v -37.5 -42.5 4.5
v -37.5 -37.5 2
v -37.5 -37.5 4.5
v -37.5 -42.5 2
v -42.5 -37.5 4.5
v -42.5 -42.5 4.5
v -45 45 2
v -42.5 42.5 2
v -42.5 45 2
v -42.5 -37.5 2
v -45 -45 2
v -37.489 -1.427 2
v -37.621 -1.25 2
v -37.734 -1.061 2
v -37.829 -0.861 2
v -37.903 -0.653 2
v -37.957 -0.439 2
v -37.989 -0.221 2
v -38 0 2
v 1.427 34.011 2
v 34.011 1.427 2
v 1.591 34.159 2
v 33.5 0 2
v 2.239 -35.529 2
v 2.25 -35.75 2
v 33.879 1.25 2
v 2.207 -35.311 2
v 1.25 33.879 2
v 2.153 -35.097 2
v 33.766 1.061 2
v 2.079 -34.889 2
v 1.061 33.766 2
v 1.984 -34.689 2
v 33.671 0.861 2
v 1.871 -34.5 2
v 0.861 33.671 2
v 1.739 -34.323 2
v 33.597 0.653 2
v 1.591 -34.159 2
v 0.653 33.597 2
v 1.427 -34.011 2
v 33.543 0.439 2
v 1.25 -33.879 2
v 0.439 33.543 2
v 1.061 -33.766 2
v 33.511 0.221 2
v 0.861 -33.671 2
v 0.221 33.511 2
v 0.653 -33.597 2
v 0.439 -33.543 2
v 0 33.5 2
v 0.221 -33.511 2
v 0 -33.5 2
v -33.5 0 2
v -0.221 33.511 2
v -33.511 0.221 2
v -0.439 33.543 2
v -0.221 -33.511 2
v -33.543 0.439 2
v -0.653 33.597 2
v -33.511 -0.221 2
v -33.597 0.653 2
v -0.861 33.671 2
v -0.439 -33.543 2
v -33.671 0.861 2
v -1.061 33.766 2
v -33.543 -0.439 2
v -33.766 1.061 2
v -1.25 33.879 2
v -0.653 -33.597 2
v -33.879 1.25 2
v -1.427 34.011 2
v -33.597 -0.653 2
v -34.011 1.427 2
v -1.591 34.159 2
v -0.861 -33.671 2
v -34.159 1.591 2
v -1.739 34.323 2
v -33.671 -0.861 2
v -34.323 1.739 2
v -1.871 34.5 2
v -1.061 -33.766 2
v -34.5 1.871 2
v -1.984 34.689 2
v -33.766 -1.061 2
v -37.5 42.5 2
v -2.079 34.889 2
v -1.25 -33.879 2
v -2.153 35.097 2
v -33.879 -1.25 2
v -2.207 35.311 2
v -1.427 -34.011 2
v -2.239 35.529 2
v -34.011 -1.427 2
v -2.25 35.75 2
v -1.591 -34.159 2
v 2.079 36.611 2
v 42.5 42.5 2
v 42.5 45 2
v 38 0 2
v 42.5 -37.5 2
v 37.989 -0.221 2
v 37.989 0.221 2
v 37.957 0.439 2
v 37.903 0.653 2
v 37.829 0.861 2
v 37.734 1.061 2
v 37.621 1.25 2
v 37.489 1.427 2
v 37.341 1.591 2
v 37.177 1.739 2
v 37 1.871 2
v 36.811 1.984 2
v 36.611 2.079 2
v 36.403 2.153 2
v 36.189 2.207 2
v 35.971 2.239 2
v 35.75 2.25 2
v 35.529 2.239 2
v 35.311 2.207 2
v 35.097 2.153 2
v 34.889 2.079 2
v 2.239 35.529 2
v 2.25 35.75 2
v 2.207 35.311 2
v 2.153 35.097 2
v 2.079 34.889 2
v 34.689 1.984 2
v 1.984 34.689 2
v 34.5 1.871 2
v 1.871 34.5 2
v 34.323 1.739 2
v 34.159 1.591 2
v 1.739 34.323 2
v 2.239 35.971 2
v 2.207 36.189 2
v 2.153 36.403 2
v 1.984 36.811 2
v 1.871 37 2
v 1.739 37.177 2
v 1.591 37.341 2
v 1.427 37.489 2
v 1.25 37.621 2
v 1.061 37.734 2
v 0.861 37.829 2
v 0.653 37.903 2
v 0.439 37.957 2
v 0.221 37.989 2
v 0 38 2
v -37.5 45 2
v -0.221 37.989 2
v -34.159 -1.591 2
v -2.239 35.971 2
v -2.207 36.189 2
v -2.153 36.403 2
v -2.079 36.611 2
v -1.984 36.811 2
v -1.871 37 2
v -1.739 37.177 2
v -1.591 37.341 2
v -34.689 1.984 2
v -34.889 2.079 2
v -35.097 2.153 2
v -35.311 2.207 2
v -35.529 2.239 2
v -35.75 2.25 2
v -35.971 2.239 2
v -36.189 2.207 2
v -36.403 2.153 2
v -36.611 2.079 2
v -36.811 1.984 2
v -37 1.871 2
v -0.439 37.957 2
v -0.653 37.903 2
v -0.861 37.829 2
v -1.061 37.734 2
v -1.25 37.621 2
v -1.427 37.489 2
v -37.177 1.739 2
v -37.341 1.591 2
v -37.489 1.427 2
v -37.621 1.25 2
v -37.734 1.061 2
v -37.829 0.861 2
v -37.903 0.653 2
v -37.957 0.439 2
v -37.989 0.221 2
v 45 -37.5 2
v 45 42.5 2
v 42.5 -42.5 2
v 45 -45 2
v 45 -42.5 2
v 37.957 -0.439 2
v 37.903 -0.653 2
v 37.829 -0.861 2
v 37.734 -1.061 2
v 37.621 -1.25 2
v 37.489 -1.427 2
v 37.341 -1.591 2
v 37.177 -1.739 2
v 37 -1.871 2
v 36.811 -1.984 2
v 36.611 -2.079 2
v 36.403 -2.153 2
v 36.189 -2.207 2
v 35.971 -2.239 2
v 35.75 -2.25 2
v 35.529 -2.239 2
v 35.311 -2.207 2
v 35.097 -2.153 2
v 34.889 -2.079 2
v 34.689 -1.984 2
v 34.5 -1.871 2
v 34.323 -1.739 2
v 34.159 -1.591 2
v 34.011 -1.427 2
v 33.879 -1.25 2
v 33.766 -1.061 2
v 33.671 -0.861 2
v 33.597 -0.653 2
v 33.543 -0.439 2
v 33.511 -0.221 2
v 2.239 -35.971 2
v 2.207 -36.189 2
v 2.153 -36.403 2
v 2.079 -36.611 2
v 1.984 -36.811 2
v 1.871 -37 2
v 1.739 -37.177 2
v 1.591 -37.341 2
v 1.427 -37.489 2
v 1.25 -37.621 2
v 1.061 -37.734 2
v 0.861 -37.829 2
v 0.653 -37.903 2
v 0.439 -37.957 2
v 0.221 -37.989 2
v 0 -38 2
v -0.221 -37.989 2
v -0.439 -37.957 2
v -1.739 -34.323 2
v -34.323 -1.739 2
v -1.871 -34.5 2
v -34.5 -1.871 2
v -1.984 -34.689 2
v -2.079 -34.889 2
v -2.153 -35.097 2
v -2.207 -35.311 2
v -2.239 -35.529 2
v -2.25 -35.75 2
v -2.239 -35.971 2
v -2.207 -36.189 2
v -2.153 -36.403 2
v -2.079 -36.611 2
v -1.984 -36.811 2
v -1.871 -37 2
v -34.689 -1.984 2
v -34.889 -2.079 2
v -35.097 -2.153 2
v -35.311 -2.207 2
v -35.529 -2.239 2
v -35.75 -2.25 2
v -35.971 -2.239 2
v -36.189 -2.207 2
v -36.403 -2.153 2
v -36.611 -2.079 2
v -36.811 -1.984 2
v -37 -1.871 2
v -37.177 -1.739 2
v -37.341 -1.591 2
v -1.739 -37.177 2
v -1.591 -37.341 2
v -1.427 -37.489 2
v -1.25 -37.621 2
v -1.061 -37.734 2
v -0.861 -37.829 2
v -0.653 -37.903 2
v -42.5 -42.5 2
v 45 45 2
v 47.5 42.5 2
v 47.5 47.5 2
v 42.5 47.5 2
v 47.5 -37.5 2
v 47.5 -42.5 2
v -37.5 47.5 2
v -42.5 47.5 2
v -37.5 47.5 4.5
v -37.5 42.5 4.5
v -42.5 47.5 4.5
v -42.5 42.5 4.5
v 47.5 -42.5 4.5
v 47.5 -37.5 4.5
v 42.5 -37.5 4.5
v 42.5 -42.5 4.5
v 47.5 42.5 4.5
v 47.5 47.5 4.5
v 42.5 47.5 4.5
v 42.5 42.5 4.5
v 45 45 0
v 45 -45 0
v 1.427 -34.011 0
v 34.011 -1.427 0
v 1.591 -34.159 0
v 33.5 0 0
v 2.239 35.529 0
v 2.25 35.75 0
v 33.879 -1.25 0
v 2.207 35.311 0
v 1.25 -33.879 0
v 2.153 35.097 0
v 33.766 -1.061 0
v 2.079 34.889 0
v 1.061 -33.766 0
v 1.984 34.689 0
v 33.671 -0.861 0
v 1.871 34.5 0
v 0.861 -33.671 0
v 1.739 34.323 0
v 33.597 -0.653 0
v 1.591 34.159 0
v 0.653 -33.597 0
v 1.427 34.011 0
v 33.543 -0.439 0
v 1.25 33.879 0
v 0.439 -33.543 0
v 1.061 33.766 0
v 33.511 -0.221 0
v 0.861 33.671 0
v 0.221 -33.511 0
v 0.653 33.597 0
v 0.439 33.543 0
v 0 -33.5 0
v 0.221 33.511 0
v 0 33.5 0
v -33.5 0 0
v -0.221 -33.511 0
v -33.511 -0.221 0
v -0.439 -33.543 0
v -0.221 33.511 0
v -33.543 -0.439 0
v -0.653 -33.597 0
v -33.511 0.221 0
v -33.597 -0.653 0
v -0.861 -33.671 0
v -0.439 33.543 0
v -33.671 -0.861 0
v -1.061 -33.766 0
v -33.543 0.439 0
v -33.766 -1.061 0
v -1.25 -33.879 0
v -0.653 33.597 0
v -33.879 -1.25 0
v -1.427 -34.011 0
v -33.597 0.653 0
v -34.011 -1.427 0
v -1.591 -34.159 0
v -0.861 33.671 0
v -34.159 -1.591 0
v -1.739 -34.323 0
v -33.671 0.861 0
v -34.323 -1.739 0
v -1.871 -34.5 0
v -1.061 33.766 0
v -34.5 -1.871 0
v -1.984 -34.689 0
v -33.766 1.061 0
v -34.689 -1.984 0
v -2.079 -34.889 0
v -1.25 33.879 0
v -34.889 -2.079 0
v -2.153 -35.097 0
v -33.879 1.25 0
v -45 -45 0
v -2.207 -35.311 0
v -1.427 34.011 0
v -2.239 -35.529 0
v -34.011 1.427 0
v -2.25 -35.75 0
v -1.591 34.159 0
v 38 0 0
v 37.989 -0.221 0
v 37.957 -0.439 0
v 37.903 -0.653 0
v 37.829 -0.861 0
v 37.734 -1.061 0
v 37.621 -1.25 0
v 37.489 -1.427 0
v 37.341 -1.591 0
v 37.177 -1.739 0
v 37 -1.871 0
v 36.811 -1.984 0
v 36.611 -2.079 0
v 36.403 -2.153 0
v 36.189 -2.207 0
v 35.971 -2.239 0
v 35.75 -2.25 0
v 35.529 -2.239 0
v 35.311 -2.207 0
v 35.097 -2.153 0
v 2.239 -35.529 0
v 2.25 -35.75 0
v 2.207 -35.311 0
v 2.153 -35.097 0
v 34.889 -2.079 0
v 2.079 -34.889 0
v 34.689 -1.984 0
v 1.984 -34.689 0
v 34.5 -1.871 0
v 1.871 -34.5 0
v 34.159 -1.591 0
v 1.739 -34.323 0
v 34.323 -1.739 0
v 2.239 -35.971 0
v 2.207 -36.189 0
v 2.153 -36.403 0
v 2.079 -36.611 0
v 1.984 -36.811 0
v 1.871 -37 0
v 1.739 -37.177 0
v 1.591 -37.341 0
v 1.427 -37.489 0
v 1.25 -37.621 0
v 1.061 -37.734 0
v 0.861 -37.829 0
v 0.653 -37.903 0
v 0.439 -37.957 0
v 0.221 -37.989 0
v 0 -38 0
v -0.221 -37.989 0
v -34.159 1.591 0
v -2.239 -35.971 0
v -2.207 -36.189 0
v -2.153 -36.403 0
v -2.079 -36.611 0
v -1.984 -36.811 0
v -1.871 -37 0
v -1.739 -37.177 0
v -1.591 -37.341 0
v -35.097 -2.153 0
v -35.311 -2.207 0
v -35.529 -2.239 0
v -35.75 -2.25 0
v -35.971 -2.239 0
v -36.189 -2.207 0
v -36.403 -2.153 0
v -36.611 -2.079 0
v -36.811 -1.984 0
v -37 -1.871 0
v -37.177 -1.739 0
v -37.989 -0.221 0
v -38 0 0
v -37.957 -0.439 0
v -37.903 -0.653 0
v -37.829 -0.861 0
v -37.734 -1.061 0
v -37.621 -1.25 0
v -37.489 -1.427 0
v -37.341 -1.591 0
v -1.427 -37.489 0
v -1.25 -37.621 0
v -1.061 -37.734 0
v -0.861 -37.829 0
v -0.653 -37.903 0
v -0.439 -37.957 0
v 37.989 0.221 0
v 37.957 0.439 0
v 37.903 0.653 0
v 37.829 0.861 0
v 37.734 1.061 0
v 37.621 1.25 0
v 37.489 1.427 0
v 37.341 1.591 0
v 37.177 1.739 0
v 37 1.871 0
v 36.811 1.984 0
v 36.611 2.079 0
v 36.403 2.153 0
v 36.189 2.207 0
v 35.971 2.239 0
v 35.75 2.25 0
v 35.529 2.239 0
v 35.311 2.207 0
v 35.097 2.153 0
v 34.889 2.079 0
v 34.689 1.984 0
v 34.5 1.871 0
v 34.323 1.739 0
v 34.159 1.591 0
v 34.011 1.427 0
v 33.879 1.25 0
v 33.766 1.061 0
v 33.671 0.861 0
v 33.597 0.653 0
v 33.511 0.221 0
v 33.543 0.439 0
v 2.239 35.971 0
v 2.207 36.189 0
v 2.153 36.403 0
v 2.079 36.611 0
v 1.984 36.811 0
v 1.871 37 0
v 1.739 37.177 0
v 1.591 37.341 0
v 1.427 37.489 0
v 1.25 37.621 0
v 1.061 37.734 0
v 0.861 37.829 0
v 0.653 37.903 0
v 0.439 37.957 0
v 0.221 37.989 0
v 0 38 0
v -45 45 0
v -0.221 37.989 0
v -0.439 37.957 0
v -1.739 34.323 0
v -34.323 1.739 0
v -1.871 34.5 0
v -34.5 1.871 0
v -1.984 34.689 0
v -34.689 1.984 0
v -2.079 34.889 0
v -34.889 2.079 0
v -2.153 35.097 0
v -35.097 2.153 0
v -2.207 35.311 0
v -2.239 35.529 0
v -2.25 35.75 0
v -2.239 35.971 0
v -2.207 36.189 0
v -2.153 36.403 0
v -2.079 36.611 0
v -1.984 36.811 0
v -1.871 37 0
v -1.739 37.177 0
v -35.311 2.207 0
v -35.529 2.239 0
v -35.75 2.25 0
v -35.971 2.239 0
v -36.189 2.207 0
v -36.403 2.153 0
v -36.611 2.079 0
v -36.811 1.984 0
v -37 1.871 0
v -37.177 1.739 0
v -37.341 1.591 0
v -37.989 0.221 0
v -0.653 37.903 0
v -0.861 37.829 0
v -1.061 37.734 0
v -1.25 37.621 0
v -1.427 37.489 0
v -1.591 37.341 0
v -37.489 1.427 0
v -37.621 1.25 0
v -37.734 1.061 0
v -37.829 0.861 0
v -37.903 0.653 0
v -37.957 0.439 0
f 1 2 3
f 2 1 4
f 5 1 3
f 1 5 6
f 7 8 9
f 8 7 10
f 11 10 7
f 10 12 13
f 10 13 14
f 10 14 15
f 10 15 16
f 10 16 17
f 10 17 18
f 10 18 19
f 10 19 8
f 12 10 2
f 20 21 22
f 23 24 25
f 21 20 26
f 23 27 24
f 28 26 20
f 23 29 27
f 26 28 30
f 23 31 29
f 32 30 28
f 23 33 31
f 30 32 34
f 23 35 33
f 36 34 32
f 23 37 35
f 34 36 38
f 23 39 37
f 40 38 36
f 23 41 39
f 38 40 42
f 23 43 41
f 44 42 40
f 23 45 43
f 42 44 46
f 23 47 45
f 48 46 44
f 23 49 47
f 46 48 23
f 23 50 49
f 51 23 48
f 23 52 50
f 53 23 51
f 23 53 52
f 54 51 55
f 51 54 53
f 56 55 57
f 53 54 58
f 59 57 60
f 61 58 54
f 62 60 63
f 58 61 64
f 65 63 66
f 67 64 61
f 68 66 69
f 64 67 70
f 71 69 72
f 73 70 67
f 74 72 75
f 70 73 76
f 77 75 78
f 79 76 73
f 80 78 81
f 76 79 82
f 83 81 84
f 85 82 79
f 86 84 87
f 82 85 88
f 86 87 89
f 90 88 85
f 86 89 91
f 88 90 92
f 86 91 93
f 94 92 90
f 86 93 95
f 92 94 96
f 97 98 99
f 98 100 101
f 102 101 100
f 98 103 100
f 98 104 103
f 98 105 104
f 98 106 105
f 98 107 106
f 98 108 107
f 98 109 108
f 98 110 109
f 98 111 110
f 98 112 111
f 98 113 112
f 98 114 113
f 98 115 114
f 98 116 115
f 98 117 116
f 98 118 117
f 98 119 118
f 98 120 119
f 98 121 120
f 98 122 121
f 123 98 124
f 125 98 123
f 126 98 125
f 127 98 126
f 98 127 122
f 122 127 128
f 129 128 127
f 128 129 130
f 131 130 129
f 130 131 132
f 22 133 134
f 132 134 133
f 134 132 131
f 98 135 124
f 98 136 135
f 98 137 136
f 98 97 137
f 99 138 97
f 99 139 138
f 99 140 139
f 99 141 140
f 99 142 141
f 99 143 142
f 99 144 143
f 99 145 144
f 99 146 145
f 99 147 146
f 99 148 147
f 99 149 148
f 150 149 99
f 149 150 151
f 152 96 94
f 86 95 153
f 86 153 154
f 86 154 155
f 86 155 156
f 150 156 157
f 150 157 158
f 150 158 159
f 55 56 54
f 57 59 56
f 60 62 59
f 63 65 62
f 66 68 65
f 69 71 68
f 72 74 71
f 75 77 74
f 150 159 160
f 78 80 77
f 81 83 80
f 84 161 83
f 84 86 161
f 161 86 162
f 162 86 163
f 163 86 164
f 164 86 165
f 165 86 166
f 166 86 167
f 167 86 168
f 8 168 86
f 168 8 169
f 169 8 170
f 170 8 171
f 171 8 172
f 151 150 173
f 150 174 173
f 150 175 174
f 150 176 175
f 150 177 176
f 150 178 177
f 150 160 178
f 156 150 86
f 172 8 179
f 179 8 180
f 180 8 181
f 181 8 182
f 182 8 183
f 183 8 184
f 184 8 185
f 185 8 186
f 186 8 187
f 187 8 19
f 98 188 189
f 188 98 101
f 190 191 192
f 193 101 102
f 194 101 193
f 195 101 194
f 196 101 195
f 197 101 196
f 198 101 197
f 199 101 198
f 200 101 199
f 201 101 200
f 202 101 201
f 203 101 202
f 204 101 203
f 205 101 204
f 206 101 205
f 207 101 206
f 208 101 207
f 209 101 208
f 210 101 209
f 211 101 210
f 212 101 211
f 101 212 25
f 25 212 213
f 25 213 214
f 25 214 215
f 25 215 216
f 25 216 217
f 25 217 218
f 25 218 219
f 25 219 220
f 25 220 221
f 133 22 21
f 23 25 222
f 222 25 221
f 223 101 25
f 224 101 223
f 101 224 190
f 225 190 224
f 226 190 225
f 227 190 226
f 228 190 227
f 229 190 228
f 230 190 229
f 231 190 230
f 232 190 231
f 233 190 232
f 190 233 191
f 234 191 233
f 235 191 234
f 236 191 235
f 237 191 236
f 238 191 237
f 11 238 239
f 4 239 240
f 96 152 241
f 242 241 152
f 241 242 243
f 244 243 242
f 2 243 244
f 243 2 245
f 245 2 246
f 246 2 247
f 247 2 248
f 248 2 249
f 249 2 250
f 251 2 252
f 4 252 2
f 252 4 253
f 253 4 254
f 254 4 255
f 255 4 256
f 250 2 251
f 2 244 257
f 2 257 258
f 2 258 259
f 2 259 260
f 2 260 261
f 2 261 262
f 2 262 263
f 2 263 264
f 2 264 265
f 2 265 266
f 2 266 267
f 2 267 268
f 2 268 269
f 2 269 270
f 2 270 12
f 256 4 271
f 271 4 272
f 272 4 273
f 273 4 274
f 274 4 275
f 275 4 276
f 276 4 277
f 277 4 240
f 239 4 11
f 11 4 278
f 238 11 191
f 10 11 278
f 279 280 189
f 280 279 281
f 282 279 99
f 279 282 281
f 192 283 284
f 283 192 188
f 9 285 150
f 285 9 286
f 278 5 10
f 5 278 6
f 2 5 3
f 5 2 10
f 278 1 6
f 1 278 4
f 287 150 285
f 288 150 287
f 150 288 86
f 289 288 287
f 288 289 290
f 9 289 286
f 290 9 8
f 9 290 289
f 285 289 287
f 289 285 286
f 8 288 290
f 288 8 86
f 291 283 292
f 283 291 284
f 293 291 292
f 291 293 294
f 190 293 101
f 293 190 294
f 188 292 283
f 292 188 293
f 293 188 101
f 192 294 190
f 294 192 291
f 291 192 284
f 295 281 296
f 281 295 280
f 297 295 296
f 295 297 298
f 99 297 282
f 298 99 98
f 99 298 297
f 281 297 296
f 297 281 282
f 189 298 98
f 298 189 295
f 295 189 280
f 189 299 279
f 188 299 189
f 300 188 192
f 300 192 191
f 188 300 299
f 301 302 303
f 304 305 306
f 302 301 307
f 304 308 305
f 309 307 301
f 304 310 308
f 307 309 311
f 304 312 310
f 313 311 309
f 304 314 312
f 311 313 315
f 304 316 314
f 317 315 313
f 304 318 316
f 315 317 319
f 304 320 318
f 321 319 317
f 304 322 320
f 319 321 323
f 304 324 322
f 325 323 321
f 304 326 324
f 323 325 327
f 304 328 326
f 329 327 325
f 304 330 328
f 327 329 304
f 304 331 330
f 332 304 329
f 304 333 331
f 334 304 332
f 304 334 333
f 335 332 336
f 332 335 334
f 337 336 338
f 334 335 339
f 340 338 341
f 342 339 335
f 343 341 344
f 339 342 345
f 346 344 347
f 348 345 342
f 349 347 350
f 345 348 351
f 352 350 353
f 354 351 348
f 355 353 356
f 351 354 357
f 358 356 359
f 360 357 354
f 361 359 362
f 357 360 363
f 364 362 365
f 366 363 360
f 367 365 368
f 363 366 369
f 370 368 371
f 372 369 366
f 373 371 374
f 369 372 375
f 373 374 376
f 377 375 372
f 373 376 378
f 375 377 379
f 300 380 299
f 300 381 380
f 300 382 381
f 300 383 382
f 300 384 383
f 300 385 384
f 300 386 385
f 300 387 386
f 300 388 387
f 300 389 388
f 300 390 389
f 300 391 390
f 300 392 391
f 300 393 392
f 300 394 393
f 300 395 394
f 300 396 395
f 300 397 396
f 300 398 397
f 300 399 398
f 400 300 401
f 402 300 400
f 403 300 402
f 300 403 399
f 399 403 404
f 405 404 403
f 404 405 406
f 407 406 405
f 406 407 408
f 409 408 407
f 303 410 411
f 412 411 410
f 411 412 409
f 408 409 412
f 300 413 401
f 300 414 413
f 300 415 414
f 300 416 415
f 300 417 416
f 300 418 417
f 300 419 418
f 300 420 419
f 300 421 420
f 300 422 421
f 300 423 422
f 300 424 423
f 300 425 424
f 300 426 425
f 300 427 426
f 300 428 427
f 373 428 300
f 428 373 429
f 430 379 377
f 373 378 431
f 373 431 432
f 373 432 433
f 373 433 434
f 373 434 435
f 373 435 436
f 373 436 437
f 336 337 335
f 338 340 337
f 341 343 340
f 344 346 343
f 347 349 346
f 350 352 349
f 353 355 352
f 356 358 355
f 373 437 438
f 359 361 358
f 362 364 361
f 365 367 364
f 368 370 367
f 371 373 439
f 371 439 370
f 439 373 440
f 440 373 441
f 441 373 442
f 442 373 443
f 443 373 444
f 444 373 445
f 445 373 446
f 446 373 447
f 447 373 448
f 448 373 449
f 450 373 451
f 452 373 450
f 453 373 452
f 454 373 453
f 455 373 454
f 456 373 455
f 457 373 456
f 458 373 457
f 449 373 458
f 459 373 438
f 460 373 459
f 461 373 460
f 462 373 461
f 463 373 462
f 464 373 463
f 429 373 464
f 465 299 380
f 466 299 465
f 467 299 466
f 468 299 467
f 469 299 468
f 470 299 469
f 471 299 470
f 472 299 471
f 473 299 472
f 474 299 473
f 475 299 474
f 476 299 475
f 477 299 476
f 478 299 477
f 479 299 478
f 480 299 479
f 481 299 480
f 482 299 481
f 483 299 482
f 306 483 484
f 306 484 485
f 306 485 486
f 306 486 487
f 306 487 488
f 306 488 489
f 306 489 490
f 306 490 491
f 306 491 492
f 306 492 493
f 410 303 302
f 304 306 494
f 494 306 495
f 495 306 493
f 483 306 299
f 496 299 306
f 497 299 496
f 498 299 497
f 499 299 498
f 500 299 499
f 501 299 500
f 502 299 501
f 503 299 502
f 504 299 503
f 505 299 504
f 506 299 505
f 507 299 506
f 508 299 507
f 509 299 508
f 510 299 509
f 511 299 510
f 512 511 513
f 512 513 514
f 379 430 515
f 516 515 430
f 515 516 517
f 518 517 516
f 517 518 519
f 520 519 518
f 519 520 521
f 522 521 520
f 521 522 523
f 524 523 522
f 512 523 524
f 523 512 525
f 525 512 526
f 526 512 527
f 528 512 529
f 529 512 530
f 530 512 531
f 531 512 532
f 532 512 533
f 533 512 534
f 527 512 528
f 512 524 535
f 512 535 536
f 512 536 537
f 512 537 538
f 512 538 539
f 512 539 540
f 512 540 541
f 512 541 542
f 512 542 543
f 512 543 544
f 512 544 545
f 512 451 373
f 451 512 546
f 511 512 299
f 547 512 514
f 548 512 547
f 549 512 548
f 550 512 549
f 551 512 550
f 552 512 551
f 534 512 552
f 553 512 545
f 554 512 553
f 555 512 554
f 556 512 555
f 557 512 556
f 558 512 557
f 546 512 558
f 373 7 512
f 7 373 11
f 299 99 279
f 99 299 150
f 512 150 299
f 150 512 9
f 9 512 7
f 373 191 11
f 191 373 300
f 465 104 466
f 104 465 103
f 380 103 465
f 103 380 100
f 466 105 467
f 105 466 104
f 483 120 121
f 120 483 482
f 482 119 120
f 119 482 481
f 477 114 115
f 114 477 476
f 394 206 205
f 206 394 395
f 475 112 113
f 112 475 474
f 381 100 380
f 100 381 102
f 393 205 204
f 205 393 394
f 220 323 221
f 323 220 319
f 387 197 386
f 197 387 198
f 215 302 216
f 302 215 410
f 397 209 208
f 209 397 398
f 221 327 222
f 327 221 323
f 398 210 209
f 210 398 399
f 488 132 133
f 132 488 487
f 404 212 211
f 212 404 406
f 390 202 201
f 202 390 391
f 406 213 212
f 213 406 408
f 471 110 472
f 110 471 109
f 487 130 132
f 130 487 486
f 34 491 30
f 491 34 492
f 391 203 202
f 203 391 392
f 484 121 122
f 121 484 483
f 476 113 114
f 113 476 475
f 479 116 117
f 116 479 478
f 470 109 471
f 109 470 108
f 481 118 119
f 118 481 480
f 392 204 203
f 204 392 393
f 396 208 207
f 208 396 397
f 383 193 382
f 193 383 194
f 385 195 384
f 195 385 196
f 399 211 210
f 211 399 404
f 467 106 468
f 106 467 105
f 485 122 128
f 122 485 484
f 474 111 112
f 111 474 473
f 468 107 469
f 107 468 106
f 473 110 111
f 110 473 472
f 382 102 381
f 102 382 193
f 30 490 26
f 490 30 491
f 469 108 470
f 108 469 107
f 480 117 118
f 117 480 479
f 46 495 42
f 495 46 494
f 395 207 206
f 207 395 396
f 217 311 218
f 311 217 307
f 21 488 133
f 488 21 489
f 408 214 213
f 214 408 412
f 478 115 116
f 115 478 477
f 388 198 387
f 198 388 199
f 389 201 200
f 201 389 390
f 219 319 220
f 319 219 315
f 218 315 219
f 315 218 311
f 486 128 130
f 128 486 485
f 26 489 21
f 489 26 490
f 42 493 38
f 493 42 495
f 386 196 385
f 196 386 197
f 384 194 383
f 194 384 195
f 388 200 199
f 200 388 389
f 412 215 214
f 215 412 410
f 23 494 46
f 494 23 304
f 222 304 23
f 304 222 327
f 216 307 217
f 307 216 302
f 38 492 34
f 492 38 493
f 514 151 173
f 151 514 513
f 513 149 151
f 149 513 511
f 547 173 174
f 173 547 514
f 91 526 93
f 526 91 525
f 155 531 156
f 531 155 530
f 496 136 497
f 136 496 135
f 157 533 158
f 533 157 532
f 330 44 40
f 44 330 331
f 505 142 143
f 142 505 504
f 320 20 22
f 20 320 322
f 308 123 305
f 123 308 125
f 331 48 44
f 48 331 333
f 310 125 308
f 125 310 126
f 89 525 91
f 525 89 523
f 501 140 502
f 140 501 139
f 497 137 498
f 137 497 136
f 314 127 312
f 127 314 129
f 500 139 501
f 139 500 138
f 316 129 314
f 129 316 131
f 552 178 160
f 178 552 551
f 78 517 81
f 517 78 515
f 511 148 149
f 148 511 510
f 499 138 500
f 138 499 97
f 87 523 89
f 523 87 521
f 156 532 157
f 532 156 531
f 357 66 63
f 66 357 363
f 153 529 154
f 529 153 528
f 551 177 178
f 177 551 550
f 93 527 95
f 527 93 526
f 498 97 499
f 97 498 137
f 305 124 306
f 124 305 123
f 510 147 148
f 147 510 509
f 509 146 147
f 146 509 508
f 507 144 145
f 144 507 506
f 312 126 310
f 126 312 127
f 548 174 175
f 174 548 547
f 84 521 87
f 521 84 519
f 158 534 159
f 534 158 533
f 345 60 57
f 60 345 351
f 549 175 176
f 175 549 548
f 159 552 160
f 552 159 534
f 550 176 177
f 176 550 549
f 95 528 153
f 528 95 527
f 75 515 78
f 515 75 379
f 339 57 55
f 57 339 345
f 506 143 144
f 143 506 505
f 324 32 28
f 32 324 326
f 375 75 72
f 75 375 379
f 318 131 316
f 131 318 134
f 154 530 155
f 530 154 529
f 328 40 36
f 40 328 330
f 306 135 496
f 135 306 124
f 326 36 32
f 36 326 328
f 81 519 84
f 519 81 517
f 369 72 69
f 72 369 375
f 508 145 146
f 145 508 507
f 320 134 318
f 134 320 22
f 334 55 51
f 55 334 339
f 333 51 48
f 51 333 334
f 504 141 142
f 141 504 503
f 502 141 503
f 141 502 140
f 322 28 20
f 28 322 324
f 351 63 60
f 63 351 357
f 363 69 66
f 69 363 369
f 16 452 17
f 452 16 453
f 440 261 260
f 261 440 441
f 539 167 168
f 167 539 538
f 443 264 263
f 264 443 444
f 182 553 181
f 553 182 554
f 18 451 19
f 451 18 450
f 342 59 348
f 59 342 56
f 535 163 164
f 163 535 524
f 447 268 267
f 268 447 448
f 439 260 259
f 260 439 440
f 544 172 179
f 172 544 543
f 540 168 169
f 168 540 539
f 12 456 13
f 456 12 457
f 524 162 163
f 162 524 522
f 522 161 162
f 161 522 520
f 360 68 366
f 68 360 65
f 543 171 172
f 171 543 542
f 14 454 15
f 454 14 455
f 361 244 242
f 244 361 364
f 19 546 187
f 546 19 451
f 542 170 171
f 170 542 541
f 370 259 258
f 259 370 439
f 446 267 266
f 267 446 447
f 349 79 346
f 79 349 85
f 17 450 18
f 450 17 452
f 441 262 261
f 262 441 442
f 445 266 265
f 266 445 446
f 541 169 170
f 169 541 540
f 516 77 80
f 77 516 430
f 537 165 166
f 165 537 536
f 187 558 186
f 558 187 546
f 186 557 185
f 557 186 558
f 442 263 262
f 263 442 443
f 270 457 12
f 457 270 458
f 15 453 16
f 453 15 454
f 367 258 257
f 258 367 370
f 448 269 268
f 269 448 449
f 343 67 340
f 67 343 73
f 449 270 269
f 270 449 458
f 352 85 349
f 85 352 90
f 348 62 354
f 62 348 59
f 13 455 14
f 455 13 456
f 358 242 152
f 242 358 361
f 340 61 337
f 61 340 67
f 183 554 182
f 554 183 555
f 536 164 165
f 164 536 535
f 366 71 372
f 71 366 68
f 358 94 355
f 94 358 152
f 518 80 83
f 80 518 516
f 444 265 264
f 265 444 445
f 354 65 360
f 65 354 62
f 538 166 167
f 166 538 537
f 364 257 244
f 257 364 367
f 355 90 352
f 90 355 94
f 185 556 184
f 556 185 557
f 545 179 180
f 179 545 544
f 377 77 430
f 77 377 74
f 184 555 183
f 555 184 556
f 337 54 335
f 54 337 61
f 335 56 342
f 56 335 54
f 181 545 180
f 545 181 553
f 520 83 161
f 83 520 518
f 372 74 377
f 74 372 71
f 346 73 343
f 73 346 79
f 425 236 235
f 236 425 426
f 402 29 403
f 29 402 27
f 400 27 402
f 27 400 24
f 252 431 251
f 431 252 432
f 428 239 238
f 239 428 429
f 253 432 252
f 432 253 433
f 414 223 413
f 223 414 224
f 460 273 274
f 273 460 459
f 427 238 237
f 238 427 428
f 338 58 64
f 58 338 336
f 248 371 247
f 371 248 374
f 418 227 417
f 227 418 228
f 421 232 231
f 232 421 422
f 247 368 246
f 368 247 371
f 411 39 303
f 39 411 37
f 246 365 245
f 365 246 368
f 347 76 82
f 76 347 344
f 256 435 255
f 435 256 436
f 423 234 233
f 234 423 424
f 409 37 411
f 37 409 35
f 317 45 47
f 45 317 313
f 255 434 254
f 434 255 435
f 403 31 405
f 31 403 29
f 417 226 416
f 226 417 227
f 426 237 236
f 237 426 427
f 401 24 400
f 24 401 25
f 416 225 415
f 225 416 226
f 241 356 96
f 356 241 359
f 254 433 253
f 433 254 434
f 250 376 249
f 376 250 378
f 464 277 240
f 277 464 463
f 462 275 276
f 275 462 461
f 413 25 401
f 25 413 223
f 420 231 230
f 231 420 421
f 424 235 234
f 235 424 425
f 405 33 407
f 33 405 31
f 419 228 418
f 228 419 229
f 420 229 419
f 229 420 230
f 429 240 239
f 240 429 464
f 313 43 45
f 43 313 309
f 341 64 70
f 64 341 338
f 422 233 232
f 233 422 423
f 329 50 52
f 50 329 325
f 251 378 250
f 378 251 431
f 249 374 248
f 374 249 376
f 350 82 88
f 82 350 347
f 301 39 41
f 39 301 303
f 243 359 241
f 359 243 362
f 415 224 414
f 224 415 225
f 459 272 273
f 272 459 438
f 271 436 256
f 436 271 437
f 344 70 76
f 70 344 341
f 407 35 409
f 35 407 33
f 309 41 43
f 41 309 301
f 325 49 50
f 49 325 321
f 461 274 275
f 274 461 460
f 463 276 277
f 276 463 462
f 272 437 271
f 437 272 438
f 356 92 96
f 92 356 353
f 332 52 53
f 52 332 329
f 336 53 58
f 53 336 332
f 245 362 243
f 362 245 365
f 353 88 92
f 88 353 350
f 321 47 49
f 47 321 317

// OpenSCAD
// DIY magnetic stirrer housing for 80 mm PC case fan
// Print orientation: top plate on bed (z = 0), walls build upward (+Z)

// ---------- Dimensions (mm) ----------
outer_size     = 90;    // outer size of top plate (X x Y)
plate_thick    = 2;     // top plate thickness (z = 0 to 2)
wall_thick     = 2.5;   // wall thickness (z = 2 to 40)
box_height     = 40;    // total height of box walls from bed
hole_d         = 4.5;   // M4 screw hole diameter
hole_pattern   = 71.5;  // square pitch of screw holes (X and Y)
notch_width    = 12;    // power cable notch width (along X)
notch_depth    = 8;     // notch depth from open edge (z = 32 to 40)
eps            = 0.5;   // overshoot for clean boolean cuts

$fn = 64;

// ---------- Model ----------
difference() {
    union() {
        // Top plate (lies flat on the bed)
        translate([-outer_size/2, -outer_size/2, 0])
            cube([outer_size, outer_size, plate_thick]);

        // Four vertical walls rising from the plate to the open top
        for (x = [-1, 1], y = [-1, 1])
            translate([x * (outer_size/2 - wall_thick),
                       y * (outer_size/2 - wall_thick),
                       plate_thick])
                cube([2 * wall_thick, 2 * wall_thick, wall_thick]);
    }

    // Screw holes through the top plate, centred on the plate
    for (a = [0, 90, 180, 270])
        rotate([0, 0, a])
            translate([hole_pattern/2, 0, -eps])
                cylinder(d = hole_d, h = plate_thick + 2*eps);

    // Power cable notch cut into one wall (z = 32 to 40)
    translate([-notch_width/2, -notch_width/2, plate_thick + wall_thick - eps])
        cube([notch_width, notch_width, notch_depth + eps]);
}
